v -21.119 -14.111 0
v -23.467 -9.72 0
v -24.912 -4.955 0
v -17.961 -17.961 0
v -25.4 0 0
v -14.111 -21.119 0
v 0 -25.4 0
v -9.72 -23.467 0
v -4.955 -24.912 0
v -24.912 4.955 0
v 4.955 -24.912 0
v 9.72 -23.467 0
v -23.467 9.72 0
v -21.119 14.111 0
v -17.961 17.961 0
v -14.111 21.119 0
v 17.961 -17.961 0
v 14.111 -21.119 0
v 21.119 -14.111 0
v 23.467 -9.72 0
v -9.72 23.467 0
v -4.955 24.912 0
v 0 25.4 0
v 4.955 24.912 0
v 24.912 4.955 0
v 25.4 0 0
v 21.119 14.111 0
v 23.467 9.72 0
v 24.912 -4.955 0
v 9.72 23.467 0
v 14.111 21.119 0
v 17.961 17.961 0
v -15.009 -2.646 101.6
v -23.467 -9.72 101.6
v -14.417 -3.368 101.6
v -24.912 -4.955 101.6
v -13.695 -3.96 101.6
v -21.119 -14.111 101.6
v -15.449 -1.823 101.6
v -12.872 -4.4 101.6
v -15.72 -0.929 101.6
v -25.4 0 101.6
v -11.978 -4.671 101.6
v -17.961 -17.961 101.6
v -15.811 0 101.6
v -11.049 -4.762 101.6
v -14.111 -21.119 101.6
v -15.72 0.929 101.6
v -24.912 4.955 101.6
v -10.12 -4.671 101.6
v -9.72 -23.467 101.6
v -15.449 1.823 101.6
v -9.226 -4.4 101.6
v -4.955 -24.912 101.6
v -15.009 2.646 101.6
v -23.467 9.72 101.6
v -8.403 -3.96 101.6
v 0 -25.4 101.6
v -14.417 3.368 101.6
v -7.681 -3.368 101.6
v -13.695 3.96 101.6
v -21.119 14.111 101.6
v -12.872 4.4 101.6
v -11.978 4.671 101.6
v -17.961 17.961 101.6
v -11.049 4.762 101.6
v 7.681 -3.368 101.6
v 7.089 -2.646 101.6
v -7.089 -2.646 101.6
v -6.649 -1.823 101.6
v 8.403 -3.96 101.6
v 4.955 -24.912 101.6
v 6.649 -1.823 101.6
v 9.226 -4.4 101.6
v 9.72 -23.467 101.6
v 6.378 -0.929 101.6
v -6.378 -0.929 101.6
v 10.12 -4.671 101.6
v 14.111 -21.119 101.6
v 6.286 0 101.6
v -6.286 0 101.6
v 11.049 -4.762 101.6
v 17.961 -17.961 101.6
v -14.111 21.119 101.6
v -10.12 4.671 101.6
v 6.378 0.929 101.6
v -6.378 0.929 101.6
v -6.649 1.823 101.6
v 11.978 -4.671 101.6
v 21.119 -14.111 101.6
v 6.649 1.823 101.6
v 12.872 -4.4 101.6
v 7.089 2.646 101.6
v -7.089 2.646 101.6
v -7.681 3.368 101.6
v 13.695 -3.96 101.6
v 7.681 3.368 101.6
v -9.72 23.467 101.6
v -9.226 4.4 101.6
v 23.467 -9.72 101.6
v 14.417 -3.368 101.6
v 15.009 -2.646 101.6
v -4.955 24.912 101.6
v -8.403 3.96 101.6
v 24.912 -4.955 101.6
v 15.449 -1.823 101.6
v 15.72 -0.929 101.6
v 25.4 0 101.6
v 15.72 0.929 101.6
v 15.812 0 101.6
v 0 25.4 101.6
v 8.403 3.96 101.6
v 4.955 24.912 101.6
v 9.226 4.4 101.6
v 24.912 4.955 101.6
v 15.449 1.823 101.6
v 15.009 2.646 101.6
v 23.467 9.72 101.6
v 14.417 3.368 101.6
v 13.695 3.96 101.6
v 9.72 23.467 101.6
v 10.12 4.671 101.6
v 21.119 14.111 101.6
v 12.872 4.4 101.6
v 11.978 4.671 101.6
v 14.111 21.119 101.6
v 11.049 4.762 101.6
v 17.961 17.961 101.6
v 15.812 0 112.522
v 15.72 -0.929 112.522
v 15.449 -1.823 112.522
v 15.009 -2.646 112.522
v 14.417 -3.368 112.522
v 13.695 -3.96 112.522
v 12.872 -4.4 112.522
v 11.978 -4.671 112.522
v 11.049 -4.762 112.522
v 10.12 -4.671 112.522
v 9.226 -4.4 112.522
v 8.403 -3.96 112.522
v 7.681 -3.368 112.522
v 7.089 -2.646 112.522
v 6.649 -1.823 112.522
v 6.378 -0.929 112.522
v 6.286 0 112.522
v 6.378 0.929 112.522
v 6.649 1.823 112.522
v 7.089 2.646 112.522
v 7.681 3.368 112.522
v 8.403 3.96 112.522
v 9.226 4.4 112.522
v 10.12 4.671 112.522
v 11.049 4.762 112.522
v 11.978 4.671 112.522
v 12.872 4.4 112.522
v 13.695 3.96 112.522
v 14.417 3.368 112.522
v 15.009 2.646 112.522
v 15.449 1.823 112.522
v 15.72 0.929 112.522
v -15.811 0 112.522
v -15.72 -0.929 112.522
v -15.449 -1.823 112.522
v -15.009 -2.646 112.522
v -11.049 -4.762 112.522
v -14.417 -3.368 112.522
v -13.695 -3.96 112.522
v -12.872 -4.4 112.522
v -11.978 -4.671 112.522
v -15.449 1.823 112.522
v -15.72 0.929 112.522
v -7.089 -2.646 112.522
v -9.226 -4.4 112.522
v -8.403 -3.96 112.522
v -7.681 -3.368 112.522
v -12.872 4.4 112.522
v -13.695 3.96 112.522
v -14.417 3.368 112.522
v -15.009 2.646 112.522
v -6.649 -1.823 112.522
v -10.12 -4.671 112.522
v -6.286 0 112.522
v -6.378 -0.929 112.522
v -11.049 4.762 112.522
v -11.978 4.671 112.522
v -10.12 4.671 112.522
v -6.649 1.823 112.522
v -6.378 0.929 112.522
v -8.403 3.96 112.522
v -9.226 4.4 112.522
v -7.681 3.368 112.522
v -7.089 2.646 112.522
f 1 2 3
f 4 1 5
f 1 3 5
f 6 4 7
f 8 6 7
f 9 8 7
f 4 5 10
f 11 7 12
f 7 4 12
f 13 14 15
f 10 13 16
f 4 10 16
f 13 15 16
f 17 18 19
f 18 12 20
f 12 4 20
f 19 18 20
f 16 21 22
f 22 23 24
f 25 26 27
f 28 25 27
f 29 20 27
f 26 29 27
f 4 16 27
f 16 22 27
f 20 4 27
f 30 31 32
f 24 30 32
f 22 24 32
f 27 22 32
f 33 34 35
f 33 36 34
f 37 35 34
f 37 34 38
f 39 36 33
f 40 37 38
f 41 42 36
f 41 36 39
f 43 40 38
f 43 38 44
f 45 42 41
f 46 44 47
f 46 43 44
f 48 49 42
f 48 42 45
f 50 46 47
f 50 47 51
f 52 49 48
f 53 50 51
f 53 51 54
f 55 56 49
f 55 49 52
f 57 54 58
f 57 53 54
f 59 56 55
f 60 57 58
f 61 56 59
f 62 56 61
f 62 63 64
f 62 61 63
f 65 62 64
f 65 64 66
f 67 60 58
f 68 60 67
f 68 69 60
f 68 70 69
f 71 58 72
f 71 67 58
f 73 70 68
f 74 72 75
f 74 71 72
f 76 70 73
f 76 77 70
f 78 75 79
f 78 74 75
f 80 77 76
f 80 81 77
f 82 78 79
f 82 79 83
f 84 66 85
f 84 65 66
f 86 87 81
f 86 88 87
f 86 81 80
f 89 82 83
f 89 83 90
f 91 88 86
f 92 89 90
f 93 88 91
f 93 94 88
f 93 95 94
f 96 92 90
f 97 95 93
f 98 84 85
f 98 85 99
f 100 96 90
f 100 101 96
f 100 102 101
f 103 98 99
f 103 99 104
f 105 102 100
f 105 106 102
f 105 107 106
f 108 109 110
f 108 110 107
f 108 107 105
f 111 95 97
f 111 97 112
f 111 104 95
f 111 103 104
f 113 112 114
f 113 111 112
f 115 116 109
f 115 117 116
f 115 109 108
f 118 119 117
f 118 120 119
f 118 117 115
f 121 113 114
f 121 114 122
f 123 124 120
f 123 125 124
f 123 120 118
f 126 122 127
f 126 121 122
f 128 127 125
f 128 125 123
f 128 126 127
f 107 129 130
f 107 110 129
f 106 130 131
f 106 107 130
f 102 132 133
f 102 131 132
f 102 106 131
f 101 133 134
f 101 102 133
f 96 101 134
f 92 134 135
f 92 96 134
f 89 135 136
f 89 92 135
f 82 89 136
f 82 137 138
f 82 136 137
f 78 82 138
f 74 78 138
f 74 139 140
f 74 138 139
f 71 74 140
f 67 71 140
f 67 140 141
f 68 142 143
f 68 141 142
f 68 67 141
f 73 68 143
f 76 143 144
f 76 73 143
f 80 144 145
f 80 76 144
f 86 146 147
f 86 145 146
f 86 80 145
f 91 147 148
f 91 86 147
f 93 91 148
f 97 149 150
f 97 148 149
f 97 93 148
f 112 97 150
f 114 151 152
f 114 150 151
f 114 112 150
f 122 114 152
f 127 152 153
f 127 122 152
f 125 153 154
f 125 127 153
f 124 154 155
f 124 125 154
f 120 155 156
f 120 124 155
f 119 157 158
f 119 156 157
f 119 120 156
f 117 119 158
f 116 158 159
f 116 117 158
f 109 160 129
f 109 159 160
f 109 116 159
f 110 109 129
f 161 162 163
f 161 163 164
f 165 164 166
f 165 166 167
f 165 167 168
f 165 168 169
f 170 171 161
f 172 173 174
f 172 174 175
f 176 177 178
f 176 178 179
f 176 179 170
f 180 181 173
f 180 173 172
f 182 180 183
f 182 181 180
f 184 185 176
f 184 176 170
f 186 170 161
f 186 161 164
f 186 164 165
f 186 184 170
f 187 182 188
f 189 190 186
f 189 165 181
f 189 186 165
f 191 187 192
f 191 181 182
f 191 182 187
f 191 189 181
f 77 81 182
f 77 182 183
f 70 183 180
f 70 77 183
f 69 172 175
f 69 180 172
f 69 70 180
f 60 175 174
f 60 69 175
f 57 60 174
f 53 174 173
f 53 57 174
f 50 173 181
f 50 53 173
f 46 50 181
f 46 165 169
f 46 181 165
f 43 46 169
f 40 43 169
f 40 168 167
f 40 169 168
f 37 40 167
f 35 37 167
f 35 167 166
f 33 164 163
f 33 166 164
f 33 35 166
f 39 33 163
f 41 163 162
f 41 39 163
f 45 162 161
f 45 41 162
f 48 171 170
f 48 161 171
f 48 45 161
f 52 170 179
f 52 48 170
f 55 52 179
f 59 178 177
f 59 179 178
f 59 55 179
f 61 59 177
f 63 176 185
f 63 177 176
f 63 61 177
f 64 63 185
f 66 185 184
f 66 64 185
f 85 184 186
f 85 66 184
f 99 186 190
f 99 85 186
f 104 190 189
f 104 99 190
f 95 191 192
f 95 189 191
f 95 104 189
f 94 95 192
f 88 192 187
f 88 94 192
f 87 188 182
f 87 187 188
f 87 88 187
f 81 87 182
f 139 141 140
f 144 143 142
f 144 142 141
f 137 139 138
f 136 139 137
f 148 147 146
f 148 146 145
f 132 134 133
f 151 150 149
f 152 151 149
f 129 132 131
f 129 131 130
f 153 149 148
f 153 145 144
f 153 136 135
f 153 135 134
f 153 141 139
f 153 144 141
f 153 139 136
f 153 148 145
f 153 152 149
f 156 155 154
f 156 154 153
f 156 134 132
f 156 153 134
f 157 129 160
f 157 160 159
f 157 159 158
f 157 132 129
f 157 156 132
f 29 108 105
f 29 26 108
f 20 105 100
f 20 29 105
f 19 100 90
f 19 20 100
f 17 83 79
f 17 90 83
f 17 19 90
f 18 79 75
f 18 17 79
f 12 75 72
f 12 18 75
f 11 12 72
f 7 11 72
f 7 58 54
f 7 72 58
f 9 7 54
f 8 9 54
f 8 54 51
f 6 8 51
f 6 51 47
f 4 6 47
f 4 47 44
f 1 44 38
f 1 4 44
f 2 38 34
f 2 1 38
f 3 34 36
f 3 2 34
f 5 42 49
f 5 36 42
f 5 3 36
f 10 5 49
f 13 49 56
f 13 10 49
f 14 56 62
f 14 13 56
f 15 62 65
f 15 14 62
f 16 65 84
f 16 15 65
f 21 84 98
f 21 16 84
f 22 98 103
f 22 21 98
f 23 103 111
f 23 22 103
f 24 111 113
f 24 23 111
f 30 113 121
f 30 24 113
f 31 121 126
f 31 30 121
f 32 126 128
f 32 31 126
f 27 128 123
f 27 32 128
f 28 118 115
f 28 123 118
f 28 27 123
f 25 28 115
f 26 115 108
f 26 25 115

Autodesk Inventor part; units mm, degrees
ref_plane "YZ Plane" through (0, 0, 0) normal (1, 0, 0) x (0, 1, 0)
ref_plane "XZ Plane" through (0, 0, 0) normal (0, 1, 0) x (-1, 0, 0)
ref_plane "XY Plane" through (0, 0, 0) normal (0, 0, 1) x (1, 0, 0)
sketch "Sketch1" plane through (0, 0, 0) normal (0, 0, 1) x (1, 0, 0)
  circle A0 centre (0, 0) radius 25.4
  dimension "d0" = 50.8
extrude "Can" add sketch "Sketch1" along normal blind 101.6
sketch "Sketch2" plane through (0, 0, 101.6) normal (0, 0, 1) x (1, 0, 0)
  circle A0 centre (0, 0) radius 25.4 projected
  circle A1 centre (-11.049, 0) radius 4.7625
  circle A2 centre (11.049, 0) radius 4.7625
  dimension "d3" = 9.525
  dimension "d4" = 22.098
  dimension "d5" = 11.049
extrude "Studs" add sketch "Sketch2" along normal blind 10.922 contours A1 | A2
thread "Stud 1" size "3/8-16 UNC" class "2A" standard "ANSI Unified Screw Threads" full length
thread "Stud 2" size "3/8-16 UNC" class "2A" standard "ANSI Unified Screw Threads" full length
equation "\"d5\" = 0.5 * d4"
properties part number "Cap"
